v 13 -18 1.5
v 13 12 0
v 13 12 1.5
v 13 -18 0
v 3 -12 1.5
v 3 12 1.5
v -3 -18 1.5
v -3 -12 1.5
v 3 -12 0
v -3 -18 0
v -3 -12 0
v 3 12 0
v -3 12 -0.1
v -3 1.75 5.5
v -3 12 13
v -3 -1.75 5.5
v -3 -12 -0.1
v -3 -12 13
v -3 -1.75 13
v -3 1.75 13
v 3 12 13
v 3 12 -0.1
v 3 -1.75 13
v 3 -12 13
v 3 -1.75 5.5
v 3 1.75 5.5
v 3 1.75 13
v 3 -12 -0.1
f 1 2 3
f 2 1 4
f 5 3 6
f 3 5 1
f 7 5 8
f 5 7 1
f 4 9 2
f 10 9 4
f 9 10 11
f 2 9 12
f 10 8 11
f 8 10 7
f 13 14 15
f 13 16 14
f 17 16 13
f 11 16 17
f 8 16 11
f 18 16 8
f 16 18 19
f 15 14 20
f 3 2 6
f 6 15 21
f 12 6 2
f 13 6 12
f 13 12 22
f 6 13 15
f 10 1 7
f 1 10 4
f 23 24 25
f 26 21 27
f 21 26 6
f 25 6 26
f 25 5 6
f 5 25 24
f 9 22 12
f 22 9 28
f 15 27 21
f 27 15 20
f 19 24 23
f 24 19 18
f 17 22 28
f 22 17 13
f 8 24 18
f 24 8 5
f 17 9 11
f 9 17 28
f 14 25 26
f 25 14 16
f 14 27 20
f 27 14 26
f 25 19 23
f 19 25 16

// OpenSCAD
X=0;
Y=1;
Z=2;

function endstop_bolt_spacing() = 19;
bolt_spacing = endstop_bolt_spacing();


circuit_size = [16, 30, 1.5];
endstop_size = [6, 24, 13];
endstop_void_size = [6, 3.5, 7.5];

circuit_center = [(circuit_size[X]-endstop_size[X])/2, -(circuit_size[Y]-endstop_size[Y])/2, circuit_size[Z]/2];
endstop_center = [0, 0, endstop_size[Z]/2];
endstop_void_center = [0, 0, endstop_size[Z]-endstop_void_size[Z]/2];

module optical_endstop_solid()
{
	translate(circuit_center)
	cube(circuit_size, center=true);

	translate(endstop_center+[0, 0, -.05])
	cube(endstop_size+[0, 0, .1], center=true);
}

module optical_endstop_void()
{
	translate(endstop_void_center+[0, 0, .05])
	cube(endstop_void_size+[.1, 0, .1], center=true);
}

module optical_endstop()
{
	difference()
	{
		optical_endstop_solid();
		optical_endstop_void();
	}
}

optical_endstop();
